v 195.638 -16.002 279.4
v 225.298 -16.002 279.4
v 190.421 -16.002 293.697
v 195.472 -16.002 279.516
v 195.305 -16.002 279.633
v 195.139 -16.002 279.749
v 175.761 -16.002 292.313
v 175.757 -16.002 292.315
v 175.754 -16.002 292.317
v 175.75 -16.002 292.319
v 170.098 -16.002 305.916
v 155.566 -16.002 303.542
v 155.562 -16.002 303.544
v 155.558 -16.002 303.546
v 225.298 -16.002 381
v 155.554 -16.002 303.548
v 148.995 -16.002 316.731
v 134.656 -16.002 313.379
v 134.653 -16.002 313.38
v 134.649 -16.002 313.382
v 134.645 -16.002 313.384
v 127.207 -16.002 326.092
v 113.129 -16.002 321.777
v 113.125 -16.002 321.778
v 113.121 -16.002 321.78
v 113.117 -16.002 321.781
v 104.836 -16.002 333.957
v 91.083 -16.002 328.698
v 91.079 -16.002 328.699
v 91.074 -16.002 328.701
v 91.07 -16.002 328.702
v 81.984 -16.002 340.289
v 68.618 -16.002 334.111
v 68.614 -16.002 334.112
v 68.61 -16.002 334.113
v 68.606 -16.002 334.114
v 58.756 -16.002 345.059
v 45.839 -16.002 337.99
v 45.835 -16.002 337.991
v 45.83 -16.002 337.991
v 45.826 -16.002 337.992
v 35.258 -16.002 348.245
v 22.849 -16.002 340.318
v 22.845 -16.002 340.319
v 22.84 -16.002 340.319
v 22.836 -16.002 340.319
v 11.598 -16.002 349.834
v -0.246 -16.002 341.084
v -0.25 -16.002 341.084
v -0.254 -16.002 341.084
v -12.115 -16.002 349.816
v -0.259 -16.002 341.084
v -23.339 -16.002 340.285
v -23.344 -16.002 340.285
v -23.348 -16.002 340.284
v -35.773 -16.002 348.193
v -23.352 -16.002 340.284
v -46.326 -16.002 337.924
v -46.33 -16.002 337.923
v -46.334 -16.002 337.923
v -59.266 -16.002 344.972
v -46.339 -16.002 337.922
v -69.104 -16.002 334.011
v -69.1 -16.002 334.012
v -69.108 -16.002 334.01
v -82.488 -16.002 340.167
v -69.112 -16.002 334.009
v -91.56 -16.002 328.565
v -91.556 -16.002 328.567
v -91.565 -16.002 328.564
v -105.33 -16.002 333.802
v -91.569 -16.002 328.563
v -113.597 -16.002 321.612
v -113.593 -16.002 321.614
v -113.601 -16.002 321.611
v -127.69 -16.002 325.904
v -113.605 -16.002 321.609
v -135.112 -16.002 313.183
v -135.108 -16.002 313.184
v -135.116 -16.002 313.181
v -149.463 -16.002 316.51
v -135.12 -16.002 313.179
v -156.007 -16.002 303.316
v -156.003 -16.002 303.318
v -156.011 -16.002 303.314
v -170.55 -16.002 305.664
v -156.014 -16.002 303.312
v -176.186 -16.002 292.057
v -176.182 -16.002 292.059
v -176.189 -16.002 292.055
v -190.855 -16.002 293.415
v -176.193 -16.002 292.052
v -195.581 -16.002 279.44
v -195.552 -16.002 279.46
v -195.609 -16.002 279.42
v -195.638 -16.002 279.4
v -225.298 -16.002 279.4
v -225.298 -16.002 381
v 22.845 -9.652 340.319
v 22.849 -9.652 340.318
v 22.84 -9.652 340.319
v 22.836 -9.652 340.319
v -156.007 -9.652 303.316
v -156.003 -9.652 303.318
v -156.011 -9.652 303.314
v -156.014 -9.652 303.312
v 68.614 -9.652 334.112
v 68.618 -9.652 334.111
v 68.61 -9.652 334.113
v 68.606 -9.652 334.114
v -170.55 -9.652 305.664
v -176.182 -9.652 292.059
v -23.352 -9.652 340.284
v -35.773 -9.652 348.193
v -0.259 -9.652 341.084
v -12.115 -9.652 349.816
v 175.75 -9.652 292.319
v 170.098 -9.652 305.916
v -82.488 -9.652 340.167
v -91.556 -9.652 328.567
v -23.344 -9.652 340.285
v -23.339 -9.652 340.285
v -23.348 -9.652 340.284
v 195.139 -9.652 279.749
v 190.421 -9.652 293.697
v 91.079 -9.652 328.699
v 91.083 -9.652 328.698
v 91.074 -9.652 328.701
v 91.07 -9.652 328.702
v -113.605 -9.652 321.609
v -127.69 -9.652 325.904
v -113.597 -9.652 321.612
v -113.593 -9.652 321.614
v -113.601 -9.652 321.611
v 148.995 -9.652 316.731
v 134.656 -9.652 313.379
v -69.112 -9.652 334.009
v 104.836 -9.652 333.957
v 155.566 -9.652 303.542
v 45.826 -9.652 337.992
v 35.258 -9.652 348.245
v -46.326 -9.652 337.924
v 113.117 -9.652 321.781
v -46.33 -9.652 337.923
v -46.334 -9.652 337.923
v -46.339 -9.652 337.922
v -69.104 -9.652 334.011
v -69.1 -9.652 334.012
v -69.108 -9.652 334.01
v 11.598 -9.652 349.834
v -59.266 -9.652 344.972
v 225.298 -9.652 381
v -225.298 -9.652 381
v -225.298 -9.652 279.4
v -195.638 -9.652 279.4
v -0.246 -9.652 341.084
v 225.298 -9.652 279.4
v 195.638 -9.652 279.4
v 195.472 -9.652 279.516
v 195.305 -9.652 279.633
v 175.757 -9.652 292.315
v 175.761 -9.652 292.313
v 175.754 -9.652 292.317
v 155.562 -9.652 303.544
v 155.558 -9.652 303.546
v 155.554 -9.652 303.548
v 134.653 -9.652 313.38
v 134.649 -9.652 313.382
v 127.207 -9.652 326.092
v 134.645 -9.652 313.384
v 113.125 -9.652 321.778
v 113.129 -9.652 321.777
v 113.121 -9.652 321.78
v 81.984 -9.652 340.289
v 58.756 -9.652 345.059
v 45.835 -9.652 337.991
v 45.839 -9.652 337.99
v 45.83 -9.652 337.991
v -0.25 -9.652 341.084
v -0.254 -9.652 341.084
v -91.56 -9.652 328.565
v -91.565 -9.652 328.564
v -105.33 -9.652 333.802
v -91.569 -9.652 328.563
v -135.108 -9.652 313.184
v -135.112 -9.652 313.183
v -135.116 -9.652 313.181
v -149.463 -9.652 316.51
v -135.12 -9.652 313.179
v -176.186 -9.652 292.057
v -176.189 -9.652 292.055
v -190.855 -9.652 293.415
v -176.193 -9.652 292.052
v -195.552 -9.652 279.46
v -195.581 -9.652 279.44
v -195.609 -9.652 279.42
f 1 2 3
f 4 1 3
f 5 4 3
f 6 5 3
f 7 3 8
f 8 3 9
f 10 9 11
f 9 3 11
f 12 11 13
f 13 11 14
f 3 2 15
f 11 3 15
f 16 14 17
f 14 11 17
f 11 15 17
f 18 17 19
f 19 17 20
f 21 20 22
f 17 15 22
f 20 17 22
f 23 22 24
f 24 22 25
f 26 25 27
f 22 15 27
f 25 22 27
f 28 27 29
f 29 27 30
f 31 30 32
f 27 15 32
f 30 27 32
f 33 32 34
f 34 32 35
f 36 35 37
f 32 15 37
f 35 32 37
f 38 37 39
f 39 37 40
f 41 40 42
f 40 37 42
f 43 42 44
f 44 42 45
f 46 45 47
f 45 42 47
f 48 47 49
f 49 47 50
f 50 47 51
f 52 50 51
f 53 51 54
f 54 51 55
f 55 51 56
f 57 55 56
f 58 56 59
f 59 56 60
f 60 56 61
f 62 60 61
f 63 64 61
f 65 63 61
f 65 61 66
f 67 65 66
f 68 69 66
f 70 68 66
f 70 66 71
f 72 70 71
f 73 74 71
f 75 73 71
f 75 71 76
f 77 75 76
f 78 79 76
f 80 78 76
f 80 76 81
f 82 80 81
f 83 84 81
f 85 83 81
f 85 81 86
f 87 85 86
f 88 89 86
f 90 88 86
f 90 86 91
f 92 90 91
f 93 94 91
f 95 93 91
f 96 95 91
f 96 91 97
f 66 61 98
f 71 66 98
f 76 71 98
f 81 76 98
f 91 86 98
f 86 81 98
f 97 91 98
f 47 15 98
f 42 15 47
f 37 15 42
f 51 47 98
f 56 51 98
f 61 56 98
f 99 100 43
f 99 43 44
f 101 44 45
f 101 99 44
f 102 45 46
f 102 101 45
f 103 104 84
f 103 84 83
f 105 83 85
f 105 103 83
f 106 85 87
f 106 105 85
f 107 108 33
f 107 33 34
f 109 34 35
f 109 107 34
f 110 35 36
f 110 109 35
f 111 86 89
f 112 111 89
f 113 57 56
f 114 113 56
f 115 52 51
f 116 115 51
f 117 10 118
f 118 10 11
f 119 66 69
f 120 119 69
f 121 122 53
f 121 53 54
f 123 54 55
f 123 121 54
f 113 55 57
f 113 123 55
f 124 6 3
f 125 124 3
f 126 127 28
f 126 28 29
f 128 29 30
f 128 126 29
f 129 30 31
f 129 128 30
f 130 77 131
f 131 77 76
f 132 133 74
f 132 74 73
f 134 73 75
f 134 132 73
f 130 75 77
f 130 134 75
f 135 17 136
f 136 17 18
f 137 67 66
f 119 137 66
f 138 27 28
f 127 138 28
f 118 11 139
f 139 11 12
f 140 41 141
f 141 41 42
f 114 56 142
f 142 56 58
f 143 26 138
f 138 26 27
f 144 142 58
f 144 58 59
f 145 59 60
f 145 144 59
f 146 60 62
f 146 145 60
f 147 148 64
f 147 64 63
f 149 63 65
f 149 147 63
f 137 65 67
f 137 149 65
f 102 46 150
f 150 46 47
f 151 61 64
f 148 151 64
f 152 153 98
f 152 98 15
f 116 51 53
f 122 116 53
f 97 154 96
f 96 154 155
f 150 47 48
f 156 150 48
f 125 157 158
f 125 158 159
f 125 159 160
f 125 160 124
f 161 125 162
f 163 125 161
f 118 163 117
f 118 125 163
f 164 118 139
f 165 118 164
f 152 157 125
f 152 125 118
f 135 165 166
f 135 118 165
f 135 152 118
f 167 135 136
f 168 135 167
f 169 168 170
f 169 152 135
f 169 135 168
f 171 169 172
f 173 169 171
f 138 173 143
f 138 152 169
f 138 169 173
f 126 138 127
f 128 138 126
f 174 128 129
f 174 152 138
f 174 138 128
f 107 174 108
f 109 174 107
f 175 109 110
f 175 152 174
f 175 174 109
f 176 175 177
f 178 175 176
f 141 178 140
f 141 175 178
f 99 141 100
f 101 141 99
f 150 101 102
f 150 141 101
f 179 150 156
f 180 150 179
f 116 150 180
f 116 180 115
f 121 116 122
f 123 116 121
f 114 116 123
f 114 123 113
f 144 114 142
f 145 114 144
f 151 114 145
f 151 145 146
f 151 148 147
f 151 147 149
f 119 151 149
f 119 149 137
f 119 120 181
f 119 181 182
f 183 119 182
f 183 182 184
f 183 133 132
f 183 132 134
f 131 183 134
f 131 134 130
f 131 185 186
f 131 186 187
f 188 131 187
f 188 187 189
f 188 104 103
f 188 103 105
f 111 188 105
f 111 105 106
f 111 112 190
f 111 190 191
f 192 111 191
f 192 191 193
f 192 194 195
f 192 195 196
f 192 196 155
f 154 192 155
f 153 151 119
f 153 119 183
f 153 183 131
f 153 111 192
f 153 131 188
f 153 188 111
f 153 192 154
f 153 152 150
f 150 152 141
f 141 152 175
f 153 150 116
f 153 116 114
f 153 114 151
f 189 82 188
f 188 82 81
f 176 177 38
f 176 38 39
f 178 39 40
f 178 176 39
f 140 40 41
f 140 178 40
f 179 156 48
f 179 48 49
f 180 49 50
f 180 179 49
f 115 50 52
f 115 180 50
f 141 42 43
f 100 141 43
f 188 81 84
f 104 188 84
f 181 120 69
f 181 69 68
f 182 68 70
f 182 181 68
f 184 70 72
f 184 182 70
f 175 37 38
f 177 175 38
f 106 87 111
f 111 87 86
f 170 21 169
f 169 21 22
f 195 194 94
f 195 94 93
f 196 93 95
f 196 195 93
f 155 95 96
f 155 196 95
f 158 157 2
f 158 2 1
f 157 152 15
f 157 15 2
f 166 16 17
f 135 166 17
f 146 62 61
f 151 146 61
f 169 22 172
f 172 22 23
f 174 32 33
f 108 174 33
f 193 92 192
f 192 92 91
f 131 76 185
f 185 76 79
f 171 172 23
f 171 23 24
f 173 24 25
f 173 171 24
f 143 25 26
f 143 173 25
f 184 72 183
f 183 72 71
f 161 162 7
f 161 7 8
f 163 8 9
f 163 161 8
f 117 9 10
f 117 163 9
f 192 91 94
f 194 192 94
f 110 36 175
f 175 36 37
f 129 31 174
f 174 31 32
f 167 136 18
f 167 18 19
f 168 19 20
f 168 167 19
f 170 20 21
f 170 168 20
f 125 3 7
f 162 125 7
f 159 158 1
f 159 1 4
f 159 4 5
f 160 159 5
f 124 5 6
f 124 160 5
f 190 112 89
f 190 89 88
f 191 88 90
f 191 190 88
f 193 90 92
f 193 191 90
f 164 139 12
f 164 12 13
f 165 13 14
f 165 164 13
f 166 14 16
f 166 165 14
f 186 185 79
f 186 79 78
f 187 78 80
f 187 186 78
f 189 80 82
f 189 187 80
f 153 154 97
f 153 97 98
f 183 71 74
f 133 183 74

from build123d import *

# Parameters (mm, degrees)
PAD_DEPTH          = 6.35
POCKET_DEPTH       = 930.254973
POLARPATTERN_COUNT = 18
POLARPATTERN_ANGLE = 66


with BuildPart() as part:
    # Sketch001 → Pad (new body)
    with BuildSketch(Plane.XZ.offset(9.652)):
        with BuildLine():
            Line((-225.298, 381), (225.298, 381))
            Line((225.298, 381), (225.298, 279.4))
            Line((225.298, 279.4), (195.637986, 279.4))
            ThreePointArc((195.637986, 279.4), (0, 341.08442), (-195.637986, 279.4))
            Line((-225.298, 279.4), (-195.637986, 279.4))
            Line((-225.298, 279.4), (-225.298, 381))
        make_face()
    extrude(amount=PAD_DEPTH)

    # Sketch002 (on Face8 of Pad) → Pocket (cut, through all)
    with BuildSketch(Plane.XZ.offset(16.002)):
        with BuildLine():
            Line((-168.490483, 291.336334), (-190.854721, 293.415253))
            Line((-190.854721, 293.415253), (-198.020414, 272.128312))
            ThreePointArc((-168.490483, 291.336334), (-183.506939, 282.118957), (-198.020414, 272.128312))
        make_face()
    pocket = extrude(amount=-POCKET_DEPTH, mode=Mode.SUBTRACT)

    # PolarPattern: Pocket ×18 about axis
    polarpattern_axis = Axis((0, 0, 0), (0, 1, 0))
    for i in range(1, POLARPATTERN_COUNT):
        add(pocket.rotate(polarpattern_axis, i * POLARPATTERN_ANGLE / (POLARPATTERN_COUNT - 1)), mode=Mode.SUBTRACT)


solid = part.part
